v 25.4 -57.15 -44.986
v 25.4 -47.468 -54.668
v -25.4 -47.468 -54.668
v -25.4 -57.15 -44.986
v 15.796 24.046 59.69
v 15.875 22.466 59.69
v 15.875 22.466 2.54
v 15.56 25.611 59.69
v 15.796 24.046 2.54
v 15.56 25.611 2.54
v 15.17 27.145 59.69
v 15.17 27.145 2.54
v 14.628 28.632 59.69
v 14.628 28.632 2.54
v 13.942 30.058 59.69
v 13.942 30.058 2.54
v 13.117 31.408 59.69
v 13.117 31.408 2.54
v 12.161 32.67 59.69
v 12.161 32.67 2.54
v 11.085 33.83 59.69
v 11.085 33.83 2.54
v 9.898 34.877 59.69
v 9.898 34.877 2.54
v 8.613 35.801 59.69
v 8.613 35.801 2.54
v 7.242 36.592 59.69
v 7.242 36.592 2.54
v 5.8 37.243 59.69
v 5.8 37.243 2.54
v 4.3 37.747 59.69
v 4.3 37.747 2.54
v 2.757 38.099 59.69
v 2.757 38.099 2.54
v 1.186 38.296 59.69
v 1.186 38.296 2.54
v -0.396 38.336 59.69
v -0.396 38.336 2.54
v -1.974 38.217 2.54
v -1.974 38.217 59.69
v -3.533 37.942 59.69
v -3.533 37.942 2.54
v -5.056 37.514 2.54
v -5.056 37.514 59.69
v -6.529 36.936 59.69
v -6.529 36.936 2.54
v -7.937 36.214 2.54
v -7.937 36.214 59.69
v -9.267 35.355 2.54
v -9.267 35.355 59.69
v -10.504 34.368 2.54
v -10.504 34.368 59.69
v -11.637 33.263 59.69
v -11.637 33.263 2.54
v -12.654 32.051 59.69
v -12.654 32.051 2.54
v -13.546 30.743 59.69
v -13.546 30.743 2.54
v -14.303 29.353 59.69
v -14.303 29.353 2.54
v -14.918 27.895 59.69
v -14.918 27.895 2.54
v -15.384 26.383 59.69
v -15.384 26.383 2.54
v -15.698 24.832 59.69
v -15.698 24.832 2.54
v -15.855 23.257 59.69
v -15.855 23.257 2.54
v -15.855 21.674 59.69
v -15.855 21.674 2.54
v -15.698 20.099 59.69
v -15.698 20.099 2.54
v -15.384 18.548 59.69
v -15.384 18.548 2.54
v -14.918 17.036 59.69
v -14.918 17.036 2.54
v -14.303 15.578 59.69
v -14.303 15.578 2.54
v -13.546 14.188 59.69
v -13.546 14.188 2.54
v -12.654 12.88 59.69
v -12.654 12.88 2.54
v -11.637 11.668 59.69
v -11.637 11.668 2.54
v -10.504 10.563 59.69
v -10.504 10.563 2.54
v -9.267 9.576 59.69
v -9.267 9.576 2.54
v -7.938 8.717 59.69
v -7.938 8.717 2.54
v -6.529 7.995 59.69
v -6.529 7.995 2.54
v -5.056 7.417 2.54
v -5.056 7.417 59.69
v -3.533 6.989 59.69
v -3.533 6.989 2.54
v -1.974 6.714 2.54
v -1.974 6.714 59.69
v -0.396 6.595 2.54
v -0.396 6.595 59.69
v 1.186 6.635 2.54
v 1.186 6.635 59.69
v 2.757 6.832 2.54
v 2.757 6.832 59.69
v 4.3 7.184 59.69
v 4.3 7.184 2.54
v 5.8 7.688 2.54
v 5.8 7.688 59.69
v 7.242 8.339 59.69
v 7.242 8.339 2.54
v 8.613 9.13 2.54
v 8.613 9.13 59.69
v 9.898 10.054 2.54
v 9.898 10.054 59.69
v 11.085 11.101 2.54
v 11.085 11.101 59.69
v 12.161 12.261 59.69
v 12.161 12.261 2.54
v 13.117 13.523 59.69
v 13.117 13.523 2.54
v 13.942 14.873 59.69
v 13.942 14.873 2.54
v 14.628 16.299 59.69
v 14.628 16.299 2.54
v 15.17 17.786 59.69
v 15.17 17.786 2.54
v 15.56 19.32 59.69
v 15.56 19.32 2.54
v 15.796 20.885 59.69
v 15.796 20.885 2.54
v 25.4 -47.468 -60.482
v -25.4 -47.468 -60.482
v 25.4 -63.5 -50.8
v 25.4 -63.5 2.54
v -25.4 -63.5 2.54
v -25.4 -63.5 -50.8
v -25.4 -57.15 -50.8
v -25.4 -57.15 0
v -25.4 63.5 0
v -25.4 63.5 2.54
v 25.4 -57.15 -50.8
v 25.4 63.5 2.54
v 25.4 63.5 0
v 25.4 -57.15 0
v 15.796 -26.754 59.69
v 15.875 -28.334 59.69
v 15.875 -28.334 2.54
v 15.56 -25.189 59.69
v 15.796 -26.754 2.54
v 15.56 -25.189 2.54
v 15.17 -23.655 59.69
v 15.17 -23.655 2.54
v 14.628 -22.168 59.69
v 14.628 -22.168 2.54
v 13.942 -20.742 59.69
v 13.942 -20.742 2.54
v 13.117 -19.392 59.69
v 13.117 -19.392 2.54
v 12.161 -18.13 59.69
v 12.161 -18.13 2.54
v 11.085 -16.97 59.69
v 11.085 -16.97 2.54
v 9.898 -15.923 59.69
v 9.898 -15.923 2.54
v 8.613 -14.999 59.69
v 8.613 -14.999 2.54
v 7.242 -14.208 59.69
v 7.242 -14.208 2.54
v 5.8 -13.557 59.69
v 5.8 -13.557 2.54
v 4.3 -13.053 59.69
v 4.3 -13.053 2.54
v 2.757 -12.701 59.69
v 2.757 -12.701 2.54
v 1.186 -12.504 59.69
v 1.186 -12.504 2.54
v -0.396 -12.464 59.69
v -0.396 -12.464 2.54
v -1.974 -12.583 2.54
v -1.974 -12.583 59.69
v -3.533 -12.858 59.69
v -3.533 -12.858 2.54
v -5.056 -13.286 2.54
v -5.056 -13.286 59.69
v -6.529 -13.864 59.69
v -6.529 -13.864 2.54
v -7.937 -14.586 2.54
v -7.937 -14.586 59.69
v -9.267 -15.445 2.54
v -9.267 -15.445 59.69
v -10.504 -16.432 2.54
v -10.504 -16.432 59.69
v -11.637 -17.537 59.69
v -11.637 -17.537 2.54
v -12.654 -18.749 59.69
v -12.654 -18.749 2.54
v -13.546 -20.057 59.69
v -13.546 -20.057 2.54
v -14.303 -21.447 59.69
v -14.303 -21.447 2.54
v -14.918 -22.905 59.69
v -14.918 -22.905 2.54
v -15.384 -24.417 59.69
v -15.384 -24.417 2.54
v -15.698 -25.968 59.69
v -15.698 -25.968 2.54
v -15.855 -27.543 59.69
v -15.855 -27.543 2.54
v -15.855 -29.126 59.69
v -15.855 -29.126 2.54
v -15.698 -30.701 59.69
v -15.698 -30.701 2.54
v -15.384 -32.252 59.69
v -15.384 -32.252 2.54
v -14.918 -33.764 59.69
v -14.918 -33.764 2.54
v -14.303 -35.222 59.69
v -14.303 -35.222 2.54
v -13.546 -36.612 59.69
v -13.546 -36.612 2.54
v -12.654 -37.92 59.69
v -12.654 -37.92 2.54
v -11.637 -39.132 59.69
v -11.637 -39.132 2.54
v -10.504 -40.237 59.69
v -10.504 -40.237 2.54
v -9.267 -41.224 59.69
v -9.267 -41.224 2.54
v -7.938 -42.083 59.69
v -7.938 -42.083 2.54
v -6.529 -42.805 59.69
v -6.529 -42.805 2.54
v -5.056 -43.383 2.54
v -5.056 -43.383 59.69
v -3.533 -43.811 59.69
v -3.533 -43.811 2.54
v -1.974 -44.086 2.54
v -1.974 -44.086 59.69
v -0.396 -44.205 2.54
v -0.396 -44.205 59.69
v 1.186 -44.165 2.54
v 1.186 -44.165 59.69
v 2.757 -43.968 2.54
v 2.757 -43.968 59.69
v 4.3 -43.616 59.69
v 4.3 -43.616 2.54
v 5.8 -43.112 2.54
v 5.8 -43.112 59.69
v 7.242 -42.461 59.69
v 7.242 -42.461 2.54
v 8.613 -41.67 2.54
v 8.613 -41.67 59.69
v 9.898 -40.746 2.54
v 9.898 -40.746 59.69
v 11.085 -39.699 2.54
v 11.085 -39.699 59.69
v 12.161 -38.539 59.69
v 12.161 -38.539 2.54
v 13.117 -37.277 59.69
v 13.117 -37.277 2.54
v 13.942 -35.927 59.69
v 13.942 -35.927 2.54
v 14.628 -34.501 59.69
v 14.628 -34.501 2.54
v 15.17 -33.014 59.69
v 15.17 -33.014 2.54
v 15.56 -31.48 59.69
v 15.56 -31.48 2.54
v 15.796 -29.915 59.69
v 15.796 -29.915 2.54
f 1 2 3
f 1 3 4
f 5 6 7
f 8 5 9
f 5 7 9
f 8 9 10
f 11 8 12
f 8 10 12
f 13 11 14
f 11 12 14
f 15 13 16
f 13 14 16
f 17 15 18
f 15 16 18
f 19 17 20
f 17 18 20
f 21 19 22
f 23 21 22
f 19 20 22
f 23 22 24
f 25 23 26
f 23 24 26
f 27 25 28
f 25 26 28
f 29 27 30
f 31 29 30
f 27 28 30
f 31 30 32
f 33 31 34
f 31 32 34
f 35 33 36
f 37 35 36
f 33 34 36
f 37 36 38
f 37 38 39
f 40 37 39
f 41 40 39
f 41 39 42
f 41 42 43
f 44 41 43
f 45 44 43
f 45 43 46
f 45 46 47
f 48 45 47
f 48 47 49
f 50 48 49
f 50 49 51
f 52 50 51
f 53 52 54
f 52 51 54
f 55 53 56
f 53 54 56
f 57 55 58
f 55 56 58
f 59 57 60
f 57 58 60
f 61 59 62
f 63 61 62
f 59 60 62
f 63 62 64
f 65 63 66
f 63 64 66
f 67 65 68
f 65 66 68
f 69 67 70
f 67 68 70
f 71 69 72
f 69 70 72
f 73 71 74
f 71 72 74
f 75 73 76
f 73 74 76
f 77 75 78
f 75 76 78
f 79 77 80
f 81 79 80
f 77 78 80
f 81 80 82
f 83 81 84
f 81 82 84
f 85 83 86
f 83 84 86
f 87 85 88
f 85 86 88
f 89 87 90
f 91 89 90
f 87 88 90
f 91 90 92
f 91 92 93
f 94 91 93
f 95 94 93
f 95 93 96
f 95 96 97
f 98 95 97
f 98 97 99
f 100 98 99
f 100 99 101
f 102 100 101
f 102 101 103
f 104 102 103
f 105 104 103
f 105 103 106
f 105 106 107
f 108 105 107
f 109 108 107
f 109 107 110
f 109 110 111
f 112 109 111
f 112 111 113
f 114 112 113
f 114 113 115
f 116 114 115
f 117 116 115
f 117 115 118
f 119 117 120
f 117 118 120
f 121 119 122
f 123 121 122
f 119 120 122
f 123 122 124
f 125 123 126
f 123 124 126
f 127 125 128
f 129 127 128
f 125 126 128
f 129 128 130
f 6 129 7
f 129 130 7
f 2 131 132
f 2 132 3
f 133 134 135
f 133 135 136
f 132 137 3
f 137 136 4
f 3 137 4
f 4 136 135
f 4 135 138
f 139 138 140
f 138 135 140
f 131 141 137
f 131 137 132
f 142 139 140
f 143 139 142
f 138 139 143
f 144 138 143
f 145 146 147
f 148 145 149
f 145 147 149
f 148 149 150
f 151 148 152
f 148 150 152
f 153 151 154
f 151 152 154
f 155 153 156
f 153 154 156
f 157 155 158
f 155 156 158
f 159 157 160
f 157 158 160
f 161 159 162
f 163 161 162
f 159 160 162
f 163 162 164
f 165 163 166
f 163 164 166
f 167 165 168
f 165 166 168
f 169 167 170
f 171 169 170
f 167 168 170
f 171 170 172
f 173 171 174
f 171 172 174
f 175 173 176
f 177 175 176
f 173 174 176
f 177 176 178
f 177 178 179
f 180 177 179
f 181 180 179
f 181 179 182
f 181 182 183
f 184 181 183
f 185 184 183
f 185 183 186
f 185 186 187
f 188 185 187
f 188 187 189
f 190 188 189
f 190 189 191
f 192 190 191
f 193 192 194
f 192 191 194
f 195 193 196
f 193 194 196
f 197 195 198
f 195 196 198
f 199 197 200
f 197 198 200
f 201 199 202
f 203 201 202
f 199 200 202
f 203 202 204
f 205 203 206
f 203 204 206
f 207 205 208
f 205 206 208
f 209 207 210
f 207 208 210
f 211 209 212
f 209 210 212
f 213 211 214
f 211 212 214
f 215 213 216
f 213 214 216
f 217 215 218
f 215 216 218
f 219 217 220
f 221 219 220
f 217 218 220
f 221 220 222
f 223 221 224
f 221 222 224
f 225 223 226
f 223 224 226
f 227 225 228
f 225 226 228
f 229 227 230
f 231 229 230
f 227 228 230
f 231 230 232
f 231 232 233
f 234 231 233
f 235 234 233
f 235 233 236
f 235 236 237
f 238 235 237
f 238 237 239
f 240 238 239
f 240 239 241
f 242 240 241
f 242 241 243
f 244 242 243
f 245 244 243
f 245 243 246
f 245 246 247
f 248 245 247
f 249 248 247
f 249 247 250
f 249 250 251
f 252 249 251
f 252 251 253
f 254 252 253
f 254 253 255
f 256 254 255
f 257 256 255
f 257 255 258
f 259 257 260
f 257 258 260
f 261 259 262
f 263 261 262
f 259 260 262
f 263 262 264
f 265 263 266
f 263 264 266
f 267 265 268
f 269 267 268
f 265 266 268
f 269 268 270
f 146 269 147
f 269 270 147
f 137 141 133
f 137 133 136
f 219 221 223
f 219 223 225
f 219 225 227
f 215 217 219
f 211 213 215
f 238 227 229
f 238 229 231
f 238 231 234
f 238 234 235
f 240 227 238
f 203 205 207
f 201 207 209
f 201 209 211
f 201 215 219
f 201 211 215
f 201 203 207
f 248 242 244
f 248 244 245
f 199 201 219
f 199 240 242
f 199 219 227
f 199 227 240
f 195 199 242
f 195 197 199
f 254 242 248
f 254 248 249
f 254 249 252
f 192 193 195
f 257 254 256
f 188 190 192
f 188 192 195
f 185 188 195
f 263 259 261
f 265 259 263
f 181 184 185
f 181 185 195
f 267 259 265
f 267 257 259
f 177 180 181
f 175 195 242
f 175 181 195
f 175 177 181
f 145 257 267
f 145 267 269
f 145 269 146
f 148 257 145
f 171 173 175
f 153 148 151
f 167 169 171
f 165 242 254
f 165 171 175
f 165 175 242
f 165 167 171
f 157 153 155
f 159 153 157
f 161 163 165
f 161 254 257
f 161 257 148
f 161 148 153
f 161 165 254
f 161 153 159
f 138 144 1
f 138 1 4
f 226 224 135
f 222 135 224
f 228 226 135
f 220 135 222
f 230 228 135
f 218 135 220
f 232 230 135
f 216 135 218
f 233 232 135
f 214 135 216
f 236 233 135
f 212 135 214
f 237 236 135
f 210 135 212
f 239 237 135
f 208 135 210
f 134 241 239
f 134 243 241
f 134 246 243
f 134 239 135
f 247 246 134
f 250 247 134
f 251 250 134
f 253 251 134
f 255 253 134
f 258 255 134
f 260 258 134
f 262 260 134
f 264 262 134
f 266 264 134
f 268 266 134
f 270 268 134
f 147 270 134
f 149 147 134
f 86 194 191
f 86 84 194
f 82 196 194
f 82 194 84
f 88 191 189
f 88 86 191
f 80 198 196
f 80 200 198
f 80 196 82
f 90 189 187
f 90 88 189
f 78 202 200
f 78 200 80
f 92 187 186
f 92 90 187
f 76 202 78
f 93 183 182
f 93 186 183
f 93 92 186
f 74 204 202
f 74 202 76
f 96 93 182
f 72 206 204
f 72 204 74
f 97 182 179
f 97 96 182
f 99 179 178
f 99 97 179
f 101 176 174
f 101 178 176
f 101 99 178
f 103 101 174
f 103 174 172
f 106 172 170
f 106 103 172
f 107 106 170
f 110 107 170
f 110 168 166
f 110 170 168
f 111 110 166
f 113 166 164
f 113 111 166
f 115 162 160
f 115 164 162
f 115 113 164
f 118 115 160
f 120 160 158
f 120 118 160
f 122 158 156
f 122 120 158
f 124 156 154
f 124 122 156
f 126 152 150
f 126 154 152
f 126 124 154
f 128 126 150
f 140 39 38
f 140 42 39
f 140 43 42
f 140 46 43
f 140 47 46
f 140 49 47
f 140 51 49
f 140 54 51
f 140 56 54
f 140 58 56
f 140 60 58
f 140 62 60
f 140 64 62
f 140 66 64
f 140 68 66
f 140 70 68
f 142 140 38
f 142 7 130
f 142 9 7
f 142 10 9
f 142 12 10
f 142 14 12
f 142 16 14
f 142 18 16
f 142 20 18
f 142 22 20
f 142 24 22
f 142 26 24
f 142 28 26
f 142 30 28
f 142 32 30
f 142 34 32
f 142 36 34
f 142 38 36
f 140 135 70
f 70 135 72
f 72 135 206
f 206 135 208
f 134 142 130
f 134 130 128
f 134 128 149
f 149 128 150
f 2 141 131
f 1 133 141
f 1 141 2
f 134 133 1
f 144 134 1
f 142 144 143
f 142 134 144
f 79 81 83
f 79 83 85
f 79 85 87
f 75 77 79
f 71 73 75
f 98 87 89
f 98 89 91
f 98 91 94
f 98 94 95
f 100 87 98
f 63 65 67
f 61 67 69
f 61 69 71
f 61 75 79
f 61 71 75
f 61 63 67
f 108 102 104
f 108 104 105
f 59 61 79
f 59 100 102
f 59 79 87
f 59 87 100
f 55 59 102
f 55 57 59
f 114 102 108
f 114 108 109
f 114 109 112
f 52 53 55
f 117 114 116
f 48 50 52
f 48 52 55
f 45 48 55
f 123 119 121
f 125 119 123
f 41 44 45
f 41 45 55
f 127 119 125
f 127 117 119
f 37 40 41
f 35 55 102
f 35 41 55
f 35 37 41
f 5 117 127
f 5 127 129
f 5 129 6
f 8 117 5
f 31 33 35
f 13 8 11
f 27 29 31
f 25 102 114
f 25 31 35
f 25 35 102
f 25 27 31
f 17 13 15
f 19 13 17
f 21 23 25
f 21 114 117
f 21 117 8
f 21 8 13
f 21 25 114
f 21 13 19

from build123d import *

# Parameters (mm, degrees)
SKETCH1_W           = 50.8
SKETCH1_H           = 127
BOSS_EXTRUDE1_DEPTH = 2.54
SKETCH2_R           = 15.875
BOSS_EXTRUDE2_DEPTH = 57.15
SKETCH3_W           = 50.8
SKETCH3_H           = 6.35
BOSS_EXTRUDE3_DEPTH = 50.8
BOSS_EXTRUDE4_DEPTH = 50.8


with BuildPart() as part:
    # Sketch1 → Boss-Extrude1 (new body)
    with BuildSketch(Plane.XY):
        Rectangle(SKETCH1_W, SKETCH1_H)
    extrude(amount=BOSS_EXTRUDE1_DEPTH)

    # Sketch2 → Boss-Extrude2 (add)
    with BuildSketch(Plane.XY.offset(2.54)):
        with Locations((0, 22.465516187)):
            Circle(SKETCH2_R)
        with Locations((0, -28.334483813)):
            Circle(SKETCH2_R)
    extrude(amount=BOSS_EXTRUDE2_DEPTH)

    # Sketch3 → Boss-Extrude3 (add)
    with BuildSketch(Plane(origin=(0, 0, 0), x_dir=(-1, 0, 0), z_dir=(0, 0, -1))):
        with Locations((0, -60.325)):
            Rectangle(SKETCH3_W, SKETCH3_H)
    extrude(amount=BOSS_EXTRUDE3_DEPTH)

    # Sketch4 → Boss-Extrude4 (add)
    with BuildSketch(Plane(origin=(25.4, 0, 0), x_dir=(0, 0, -1), z_dir=(1, 0, 0))):
        Polygon((44.45, -63.5), (60.482117808, -47.467882192), (54.66777369, -47.467882192), (38.635655882, -63.5), align=None)
    extrude(amount=-BOSS_EXTRUDE4_DEPTH)


solid = part.part
